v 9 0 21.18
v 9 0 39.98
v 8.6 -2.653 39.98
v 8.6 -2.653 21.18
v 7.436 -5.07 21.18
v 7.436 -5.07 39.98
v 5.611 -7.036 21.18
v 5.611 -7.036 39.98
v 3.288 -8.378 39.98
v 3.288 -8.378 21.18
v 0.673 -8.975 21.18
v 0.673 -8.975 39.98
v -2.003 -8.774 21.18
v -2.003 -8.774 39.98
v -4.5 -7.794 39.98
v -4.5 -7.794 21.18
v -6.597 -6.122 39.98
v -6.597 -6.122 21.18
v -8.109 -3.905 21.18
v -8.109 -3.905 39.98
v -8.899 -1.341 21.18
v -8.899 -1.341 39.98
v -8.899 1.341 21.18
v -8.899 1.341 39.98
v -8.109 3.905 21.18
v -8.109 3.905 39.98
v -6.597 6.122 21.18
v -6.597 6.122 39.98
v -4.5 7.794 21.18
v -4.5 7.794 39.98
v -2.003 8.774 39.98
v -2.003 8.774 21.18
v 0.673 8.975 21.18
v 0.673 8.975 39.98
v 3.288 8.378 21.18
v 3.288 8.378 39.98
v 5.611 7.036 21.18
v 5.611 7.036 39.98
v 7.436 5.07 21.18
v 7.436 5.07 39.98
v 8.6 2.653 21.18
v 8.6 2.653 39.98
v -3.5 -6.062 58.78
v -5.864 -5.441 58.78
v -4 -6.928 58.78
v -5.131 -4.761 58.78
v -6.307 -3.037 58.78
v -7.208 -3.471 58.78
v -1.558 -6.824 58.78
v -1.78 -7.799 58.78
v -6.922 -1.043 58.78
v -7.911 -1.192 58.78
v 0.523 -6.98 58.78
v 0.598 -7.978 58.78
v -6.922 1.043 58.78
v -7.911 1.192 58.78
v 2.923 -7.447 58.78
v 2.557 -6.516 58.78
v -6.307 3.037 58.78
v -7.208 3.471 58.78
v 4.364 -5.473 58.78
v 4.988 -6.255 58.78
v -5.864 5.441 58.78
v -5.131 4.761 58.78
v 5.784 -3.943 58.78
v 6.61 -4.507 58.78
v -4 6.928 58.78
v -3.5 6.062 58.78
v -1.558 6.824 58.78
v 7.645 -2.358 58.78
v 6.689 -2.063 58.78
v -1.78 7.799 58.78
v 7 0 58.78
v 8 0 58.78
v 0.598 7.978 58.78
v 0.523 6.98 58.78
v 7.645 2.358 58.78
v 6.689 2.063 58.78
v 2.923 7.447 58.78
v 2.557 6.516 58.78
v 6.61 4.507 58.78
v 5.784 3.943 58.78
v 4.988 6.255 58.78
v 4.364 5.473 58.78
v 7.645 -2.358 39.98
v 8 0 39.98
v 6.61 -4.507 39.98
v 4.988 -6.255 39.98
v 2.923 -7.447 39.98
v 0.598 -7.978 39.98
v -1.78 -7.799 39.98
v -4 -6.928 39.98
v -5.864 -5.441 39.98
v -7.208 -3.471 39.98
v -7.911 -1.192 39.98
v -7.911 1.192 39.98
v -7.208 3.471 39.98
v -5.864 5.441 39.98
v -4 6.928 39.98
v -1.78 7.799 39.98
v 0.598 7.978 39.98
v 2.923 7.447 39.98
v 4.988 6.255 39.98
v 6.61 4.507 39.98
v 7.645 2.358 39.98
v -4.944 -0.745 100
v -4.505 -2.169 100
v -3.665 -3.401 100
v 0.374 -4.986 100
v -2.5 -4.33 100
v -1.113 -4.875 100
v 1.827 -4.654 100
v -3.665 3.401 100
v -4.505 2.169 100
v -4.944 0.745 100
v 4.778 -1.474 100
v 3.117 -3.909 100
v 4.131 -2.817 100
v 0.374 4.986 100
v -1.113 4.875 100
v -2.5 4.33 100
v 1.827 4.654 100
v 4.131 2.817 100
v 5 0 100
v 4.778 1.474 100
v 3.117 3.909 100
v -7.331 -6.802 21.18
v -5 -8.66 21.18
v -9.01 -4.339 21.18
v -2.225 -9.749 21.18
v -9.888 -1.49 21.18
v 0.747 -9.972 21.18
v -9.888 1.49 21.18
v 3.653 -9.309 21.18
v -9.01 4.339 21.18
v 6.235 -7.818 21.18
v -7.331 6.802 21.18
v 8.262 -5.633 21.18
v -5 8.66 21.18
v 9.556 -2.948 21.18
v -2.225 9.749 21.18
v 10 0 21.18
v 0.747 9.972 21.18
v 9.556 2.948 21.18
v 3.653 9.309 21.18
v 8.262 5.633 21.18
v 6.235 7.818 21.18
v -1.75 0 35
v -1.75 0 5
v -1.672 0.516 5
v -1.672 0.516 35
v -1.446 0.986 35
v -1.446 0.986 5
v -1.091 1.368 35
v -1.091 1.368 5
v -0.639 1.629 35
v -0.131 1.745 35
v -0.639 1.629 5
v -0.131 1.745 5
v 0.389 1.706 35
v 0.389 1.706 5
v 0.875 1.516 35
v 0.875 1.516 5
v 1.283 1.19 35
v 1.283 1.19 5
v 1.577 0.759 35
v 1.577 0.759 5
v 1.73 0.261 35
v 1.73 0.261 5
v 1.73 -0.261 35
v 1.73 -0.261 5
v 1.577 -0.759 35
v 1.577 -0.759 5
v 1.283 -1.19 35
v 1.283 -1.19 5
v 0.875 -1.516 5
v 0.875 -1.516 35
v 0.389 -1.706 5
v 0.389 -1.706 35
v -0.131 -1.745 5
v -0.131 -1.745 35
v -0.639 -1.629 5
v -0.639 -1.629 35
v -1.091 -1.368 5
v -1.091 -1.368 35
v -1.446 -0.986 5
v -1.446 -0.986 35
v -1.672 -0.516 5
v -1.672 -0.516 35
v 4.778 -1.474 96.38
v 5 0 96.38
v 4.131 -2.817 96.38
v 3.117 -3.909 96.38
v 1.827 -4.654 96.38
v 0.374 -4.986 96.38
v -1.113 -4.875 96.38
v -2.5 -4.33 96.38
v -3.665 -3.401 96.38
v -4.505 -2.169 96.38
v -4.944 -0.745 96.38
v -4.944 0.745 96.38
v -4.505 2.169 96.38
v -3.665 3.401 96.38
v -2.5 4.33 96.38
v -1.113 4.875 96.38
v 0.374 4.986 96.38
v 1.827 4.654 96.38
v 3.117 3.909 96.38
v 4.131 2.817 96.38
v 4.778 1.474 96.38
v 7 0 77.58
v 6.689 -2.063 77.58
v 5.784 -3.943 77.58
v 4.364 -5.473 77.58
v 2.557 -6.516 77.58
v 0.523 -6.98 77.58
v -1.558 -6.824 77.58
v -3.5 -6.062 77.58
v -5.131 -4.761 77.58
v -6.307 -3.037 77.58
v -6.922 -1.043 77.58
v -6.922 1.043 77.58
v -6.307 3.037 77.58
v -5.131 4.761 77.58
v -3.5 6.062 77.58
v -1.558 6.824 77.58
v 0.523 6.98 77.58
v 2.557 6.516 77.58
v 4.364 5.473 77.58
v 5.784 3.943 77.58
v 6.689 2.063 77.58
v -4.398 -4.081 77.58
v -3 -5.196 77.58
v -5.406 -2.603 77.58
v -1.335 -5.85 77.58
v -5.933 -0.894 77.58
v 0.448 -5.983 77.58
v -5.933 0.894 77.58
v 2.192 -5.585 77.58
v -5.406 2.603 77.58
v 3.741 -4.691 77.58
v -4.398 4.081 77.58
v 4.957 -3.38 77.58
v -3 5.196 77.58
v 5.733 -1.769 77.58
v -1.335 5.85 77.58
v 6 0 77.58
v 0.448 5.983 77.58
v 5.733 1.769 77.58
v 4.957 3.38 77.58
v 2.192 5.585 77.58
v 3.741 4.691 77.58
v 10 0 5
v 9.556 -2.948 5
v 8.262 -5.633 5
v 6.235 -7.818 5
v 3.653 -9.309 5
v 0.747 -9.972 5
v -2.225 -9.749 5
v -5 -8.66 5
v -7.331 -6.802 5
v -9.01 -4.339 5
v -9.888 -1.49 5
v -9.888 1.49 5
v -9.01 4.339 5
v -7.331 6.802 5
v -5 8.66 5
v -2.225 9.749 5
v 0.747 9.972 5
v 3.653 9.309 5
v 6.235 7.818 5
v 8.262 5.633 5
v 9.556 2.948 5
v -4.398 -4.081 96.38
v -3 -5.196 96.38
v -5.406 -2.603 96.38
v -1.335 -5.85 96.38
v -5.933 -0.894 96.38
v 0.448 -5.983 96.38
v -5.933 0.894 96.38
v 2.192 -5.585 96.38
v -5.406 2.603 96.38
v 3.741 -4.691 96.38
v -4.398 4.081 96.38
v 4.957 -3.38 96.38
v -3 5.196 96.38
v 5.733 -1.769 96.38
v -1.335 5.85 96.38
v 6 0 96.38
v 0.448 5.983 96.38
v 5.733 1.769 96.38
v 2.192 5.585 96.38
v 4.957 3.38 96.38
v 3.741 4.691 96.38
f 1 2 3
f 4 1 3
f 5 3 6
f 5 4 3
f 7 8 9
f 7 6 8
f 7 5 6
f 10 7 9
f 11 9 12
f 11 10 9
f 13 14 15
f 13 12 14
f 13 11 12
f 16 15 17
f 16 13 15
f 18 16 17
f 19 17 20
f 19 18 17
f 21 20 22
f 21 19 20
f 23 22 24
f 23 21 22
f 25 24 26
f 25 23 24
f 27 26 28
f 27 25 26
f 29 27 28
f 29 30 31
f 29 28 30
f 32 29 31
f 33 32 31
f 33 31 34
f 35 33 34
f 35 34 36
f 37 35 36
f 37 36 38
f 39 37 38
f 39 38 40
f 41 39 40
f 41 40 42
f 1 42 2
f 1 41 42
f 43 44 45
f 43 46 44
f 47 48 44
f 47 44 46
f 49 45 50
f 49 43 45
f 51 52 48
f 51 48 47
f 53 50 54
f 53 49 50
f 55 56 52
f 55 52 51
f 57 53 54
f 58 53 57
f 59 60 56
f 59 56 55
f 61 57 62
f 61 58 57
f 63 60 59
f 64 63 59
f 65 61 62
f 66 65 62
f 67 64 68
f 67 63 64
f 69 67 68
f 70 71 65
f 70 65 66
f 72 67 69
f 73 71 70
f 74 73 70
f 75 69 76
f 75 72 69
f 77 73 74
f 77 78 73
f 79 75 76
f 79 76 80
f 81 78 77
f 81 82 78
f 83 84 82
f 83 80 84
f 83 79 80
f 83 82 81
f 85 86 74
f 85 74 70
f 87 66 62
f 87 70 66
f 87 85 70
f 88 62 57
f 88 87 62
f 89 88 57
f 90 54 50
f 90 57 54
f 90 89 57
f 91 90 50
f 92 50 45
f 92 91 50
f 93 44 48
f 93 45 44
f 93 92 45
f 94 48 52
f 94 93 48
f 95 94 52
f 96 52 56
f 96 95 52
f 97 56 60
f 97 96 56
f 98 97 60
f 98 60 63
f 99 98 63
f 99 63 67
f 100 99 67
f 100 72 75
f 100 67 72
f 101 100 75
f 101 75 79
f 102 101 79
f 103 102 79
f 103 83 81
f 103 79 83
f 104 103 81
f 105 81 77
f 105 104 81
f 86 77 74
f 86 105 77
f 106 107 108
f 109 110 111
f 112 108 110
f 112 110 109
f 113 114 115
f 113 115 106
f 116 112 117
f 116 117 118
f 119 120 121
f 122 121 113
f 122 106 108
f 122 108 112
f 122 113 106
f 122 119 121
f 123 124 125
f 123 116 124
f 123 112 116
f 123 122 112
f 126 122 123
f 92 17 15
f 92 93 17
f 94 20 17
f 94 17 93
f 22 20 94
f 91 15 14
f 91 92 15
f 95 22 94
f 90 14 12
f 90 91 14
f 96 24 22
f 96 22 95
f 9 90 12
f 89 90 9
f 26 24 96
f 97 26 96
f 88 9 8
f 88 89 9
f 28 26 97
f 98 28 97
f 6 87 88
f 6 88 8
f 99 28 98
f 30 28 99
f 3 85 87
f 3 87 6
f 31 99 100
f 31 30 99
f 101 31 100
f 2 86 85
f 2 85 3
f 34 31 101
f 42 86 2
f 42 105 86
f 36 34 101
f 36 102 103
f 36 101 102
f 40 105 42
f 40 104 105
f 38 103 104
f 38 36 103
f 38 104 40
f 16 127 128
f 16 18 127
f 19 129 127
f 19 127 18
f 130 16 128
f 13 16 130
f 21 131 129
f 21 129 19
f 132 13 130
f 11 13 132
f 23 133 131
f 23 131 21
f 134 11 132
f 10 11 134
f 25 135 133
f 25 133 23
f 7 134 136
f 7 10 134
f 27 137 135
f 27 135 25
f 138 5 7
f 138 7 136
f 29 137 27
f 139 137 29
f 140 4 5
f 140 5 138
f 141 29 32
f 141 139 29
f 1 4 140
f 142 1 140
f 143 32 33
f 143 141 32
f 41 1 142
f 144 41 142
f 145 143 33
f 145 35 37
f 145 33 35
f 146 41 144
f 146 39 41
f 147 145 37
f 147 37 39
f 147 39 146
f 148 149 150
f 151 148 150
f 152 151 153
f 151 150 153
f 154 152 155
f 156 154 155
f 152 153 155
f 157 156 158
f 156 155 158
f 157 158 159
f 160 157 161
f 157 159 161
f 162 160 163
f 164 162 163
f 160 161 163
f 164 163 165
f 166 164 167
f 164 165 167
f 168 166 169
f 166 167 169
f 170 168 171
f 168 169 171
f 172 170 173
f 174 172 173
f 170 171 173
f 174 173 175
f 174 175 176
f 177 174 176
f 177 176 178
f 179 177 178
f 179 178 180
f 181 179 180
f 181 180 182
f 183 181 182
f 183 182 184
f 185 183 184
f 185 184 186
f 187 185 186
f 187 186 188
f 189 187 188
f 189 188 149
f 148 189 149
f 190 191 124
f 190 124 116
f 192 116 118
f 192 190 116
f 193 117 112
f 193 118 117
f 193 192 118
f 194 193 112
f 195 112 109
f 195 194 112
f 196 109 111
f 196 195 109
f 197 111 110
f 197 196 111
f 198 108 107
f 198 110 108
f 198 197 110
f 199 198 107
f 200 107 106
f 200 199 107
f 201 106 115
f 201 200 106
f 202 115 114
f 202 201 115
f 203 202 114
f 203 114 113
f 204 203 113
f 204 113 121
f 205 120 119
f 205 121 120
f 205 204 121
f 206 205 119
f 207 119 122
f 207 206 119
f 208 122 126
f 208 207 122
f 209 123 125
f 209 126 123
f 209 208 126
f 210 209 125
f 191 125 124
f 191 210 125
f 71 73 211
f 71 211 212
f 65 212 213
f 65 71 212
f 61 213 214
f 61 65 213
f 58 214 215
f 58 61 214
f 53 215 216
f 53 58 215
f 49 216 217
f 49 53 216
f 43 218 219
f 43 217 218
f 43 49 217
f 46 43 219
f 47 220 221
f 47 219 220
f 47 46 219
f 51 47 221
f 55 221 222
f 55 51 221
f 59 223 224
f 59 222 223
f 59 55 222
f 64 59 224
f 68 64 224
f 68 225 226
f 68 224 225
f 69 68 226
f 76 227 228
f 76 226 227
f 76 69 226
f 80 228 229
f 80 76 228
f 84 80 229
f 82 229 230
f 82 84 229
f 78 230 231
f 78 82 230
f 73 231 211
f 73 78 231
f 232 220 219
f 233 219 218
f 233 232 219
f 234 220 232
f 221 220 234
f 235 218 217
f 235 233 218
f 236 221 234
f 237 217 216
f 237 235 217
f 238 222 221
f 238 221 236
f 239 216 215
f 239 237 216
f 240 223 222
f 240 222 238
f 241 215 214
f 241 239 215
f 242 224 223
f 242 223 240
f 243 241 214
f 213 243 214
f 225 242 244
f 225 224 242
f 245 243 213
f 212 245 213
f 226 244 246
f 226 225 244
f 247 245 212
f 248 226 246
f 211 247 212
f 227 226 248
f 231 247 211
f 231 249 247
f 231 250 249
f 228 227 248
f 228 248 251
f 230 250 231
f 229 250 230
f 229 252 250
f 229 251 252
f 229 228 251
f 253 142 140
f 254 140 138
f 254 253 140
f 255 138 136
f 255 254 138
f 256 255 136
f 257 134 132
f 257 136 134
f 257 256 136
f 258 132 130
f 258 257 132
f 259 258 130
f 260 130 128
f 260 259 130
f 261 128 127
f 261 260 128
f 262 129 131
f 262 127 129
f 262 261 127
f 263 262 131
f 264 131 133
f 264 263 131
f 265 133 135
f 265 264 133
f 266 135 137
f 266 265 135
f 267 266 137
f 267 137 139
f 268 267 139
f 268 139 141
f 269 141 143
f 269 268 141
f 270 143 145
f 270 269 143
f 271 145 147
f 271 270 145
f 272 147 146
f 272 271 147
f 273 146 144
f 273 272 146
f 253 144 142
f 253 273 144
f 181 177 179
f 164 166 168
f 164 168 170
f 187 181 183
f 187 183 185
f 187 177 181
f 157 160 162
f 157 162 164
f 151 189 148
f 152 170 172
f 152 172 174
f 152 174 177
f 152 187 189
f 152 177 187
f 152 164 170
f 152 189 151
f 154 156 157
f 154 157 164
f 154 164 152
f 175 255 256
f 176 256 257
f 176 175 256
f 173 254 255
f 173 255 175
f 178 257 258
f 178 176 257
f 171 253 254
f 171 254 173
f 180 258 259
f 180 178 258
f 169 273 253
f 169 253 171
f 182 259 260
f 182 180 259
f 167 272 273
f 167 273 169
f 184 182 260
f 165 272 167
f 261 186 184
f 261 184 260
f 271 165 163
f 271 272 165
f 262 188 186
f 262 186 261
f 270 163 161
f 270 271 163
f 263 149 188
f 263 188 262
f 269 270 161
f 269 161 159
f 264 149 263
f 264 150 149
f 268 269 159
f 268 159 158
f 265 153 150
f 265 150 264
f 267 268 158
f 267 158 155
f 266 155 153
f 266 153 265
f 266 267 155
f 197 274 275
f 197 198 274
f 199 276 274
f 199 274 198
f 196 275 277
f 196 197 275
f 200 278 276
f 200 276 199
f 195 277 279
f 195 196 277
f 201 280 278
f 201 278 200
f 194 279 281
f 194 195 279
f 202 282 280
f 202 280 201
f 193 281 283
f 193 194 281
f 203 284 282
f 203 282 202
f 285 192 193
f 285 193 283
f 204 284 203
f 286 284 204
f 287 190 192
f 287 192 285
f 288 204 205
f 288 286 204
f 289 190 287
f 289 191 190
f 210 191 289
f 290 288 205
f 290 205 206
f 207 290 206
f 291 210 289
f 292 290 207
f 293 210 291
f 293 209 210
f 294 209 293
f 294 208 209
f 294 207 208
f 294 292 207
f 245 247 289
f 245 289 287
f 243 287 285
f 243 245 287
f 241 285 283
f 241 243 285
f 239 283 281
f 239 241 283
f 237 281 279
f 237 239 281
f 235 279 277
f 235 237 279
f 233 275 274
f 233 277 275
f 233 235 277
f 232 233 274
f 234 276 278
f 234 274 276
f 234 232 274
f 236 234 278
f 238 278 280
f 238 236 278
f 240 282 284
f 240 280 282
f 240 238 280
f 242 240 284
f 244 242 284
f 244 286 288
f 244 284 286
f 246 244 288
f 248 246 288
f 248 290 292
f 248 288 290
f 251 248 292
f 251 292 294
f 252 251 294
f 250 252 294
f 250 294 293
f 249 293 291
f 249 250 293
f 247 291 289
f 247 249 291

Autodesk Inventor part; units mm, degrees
ref_plane "YZ Plane" through (0, 0, 0) normal (1, 0, 0) x (0, 1, 0)
ref_plane "XZ Plane" through (0, 0, 0) normal (0, 1, 0) x (-1, 0, 0)
ref_plane "XY Plane" through (0, 0, 0) normal (0, 0, 1) x (1, 0, 0)
sketch "Sketch1" plane through (0, 0, 0) normal (0, 0, 1) x (1, 0, 0)
  circle A0 centre (0, 0) radius 15
  dimension "d0" = 30
extrude "Extrusion1" add sketch "Sketch1" along normal blind 3
sketch "Sketch2" plane through (0, 0, 3) normal (0, 0, 1) x (1, 0, 0)
  circle A0 centre (0, 0) radius 10
  dimension "d3" = 20
extrude "Extrusion2" add sketch "Sketch2" along normal blind 18.18
sketch "Sketch3" plane through (0, 0, 21.18) normal (0, 0, 1) x (1, 0, 0)
  circle A0 centre (0, 0) radius 9
  dimension "d6" = 18
extrude "Extrusion3" add sketch "Sketch3" along normal blind 18.8
sketch "Sketch4" plane through (0, 0, 39.98) normal (0, 0, 1) x (1, 0, 0)
  circle A0 centre (0, 0) radius 8
  dimension "d9" = 16
extrude "Extrusion4" add sketch "Sketch4" along normal blind 18.8
sketch "Sketch5" plane through (0, 0, 58.78) normal (0, 0, 1) x (1, 0, 0)
  circle A0 centre (0, 0) radius 7
  dimension "d12" = 14
extrude "Extrusion5" add sketch "Sketch5" along normal blind 18.8
sketch "Sketch6" plane through (0, 0, 77.58) normal (0, 0, 1) x (1, 0, 0)
  circle A0 centre (0, 0) radius 6
  dimension "d15" = 12
extrude "Extrusion6" add sketch "Sketch6" along normal blind 18.8
sketch "Sketch7" plane through (0, 0, 96.38) normal (0, 0, 1) x (1, 0, 0)
  circle A0 centre (0, 0) radius 5
  dimension "d18" = 10
extrude "Extrusion7" add sketch "Sketch7" along normal blind 3.62
sketch "Sketch8" plane through (0, 0, 0) normal (0, 0, -1) x (-1, 0, 0)
  circle A0 centre (0, 0) radius 20
  dimension "d21" = 40
extrude "Extrusion8" cut sketch "Sketch8" against normal blind 5
sketch "Sketch9" plane through (0, 0, 5) normal (0, 0, -1) x (-1, 0, 0)
  circle A0 centre (0, 0) radius 1.75
  dimension "d24" = 3.5
extrude "Extrusion9" cut sketch "Sketch9" against normal blind 30
properties part number "Guide"
